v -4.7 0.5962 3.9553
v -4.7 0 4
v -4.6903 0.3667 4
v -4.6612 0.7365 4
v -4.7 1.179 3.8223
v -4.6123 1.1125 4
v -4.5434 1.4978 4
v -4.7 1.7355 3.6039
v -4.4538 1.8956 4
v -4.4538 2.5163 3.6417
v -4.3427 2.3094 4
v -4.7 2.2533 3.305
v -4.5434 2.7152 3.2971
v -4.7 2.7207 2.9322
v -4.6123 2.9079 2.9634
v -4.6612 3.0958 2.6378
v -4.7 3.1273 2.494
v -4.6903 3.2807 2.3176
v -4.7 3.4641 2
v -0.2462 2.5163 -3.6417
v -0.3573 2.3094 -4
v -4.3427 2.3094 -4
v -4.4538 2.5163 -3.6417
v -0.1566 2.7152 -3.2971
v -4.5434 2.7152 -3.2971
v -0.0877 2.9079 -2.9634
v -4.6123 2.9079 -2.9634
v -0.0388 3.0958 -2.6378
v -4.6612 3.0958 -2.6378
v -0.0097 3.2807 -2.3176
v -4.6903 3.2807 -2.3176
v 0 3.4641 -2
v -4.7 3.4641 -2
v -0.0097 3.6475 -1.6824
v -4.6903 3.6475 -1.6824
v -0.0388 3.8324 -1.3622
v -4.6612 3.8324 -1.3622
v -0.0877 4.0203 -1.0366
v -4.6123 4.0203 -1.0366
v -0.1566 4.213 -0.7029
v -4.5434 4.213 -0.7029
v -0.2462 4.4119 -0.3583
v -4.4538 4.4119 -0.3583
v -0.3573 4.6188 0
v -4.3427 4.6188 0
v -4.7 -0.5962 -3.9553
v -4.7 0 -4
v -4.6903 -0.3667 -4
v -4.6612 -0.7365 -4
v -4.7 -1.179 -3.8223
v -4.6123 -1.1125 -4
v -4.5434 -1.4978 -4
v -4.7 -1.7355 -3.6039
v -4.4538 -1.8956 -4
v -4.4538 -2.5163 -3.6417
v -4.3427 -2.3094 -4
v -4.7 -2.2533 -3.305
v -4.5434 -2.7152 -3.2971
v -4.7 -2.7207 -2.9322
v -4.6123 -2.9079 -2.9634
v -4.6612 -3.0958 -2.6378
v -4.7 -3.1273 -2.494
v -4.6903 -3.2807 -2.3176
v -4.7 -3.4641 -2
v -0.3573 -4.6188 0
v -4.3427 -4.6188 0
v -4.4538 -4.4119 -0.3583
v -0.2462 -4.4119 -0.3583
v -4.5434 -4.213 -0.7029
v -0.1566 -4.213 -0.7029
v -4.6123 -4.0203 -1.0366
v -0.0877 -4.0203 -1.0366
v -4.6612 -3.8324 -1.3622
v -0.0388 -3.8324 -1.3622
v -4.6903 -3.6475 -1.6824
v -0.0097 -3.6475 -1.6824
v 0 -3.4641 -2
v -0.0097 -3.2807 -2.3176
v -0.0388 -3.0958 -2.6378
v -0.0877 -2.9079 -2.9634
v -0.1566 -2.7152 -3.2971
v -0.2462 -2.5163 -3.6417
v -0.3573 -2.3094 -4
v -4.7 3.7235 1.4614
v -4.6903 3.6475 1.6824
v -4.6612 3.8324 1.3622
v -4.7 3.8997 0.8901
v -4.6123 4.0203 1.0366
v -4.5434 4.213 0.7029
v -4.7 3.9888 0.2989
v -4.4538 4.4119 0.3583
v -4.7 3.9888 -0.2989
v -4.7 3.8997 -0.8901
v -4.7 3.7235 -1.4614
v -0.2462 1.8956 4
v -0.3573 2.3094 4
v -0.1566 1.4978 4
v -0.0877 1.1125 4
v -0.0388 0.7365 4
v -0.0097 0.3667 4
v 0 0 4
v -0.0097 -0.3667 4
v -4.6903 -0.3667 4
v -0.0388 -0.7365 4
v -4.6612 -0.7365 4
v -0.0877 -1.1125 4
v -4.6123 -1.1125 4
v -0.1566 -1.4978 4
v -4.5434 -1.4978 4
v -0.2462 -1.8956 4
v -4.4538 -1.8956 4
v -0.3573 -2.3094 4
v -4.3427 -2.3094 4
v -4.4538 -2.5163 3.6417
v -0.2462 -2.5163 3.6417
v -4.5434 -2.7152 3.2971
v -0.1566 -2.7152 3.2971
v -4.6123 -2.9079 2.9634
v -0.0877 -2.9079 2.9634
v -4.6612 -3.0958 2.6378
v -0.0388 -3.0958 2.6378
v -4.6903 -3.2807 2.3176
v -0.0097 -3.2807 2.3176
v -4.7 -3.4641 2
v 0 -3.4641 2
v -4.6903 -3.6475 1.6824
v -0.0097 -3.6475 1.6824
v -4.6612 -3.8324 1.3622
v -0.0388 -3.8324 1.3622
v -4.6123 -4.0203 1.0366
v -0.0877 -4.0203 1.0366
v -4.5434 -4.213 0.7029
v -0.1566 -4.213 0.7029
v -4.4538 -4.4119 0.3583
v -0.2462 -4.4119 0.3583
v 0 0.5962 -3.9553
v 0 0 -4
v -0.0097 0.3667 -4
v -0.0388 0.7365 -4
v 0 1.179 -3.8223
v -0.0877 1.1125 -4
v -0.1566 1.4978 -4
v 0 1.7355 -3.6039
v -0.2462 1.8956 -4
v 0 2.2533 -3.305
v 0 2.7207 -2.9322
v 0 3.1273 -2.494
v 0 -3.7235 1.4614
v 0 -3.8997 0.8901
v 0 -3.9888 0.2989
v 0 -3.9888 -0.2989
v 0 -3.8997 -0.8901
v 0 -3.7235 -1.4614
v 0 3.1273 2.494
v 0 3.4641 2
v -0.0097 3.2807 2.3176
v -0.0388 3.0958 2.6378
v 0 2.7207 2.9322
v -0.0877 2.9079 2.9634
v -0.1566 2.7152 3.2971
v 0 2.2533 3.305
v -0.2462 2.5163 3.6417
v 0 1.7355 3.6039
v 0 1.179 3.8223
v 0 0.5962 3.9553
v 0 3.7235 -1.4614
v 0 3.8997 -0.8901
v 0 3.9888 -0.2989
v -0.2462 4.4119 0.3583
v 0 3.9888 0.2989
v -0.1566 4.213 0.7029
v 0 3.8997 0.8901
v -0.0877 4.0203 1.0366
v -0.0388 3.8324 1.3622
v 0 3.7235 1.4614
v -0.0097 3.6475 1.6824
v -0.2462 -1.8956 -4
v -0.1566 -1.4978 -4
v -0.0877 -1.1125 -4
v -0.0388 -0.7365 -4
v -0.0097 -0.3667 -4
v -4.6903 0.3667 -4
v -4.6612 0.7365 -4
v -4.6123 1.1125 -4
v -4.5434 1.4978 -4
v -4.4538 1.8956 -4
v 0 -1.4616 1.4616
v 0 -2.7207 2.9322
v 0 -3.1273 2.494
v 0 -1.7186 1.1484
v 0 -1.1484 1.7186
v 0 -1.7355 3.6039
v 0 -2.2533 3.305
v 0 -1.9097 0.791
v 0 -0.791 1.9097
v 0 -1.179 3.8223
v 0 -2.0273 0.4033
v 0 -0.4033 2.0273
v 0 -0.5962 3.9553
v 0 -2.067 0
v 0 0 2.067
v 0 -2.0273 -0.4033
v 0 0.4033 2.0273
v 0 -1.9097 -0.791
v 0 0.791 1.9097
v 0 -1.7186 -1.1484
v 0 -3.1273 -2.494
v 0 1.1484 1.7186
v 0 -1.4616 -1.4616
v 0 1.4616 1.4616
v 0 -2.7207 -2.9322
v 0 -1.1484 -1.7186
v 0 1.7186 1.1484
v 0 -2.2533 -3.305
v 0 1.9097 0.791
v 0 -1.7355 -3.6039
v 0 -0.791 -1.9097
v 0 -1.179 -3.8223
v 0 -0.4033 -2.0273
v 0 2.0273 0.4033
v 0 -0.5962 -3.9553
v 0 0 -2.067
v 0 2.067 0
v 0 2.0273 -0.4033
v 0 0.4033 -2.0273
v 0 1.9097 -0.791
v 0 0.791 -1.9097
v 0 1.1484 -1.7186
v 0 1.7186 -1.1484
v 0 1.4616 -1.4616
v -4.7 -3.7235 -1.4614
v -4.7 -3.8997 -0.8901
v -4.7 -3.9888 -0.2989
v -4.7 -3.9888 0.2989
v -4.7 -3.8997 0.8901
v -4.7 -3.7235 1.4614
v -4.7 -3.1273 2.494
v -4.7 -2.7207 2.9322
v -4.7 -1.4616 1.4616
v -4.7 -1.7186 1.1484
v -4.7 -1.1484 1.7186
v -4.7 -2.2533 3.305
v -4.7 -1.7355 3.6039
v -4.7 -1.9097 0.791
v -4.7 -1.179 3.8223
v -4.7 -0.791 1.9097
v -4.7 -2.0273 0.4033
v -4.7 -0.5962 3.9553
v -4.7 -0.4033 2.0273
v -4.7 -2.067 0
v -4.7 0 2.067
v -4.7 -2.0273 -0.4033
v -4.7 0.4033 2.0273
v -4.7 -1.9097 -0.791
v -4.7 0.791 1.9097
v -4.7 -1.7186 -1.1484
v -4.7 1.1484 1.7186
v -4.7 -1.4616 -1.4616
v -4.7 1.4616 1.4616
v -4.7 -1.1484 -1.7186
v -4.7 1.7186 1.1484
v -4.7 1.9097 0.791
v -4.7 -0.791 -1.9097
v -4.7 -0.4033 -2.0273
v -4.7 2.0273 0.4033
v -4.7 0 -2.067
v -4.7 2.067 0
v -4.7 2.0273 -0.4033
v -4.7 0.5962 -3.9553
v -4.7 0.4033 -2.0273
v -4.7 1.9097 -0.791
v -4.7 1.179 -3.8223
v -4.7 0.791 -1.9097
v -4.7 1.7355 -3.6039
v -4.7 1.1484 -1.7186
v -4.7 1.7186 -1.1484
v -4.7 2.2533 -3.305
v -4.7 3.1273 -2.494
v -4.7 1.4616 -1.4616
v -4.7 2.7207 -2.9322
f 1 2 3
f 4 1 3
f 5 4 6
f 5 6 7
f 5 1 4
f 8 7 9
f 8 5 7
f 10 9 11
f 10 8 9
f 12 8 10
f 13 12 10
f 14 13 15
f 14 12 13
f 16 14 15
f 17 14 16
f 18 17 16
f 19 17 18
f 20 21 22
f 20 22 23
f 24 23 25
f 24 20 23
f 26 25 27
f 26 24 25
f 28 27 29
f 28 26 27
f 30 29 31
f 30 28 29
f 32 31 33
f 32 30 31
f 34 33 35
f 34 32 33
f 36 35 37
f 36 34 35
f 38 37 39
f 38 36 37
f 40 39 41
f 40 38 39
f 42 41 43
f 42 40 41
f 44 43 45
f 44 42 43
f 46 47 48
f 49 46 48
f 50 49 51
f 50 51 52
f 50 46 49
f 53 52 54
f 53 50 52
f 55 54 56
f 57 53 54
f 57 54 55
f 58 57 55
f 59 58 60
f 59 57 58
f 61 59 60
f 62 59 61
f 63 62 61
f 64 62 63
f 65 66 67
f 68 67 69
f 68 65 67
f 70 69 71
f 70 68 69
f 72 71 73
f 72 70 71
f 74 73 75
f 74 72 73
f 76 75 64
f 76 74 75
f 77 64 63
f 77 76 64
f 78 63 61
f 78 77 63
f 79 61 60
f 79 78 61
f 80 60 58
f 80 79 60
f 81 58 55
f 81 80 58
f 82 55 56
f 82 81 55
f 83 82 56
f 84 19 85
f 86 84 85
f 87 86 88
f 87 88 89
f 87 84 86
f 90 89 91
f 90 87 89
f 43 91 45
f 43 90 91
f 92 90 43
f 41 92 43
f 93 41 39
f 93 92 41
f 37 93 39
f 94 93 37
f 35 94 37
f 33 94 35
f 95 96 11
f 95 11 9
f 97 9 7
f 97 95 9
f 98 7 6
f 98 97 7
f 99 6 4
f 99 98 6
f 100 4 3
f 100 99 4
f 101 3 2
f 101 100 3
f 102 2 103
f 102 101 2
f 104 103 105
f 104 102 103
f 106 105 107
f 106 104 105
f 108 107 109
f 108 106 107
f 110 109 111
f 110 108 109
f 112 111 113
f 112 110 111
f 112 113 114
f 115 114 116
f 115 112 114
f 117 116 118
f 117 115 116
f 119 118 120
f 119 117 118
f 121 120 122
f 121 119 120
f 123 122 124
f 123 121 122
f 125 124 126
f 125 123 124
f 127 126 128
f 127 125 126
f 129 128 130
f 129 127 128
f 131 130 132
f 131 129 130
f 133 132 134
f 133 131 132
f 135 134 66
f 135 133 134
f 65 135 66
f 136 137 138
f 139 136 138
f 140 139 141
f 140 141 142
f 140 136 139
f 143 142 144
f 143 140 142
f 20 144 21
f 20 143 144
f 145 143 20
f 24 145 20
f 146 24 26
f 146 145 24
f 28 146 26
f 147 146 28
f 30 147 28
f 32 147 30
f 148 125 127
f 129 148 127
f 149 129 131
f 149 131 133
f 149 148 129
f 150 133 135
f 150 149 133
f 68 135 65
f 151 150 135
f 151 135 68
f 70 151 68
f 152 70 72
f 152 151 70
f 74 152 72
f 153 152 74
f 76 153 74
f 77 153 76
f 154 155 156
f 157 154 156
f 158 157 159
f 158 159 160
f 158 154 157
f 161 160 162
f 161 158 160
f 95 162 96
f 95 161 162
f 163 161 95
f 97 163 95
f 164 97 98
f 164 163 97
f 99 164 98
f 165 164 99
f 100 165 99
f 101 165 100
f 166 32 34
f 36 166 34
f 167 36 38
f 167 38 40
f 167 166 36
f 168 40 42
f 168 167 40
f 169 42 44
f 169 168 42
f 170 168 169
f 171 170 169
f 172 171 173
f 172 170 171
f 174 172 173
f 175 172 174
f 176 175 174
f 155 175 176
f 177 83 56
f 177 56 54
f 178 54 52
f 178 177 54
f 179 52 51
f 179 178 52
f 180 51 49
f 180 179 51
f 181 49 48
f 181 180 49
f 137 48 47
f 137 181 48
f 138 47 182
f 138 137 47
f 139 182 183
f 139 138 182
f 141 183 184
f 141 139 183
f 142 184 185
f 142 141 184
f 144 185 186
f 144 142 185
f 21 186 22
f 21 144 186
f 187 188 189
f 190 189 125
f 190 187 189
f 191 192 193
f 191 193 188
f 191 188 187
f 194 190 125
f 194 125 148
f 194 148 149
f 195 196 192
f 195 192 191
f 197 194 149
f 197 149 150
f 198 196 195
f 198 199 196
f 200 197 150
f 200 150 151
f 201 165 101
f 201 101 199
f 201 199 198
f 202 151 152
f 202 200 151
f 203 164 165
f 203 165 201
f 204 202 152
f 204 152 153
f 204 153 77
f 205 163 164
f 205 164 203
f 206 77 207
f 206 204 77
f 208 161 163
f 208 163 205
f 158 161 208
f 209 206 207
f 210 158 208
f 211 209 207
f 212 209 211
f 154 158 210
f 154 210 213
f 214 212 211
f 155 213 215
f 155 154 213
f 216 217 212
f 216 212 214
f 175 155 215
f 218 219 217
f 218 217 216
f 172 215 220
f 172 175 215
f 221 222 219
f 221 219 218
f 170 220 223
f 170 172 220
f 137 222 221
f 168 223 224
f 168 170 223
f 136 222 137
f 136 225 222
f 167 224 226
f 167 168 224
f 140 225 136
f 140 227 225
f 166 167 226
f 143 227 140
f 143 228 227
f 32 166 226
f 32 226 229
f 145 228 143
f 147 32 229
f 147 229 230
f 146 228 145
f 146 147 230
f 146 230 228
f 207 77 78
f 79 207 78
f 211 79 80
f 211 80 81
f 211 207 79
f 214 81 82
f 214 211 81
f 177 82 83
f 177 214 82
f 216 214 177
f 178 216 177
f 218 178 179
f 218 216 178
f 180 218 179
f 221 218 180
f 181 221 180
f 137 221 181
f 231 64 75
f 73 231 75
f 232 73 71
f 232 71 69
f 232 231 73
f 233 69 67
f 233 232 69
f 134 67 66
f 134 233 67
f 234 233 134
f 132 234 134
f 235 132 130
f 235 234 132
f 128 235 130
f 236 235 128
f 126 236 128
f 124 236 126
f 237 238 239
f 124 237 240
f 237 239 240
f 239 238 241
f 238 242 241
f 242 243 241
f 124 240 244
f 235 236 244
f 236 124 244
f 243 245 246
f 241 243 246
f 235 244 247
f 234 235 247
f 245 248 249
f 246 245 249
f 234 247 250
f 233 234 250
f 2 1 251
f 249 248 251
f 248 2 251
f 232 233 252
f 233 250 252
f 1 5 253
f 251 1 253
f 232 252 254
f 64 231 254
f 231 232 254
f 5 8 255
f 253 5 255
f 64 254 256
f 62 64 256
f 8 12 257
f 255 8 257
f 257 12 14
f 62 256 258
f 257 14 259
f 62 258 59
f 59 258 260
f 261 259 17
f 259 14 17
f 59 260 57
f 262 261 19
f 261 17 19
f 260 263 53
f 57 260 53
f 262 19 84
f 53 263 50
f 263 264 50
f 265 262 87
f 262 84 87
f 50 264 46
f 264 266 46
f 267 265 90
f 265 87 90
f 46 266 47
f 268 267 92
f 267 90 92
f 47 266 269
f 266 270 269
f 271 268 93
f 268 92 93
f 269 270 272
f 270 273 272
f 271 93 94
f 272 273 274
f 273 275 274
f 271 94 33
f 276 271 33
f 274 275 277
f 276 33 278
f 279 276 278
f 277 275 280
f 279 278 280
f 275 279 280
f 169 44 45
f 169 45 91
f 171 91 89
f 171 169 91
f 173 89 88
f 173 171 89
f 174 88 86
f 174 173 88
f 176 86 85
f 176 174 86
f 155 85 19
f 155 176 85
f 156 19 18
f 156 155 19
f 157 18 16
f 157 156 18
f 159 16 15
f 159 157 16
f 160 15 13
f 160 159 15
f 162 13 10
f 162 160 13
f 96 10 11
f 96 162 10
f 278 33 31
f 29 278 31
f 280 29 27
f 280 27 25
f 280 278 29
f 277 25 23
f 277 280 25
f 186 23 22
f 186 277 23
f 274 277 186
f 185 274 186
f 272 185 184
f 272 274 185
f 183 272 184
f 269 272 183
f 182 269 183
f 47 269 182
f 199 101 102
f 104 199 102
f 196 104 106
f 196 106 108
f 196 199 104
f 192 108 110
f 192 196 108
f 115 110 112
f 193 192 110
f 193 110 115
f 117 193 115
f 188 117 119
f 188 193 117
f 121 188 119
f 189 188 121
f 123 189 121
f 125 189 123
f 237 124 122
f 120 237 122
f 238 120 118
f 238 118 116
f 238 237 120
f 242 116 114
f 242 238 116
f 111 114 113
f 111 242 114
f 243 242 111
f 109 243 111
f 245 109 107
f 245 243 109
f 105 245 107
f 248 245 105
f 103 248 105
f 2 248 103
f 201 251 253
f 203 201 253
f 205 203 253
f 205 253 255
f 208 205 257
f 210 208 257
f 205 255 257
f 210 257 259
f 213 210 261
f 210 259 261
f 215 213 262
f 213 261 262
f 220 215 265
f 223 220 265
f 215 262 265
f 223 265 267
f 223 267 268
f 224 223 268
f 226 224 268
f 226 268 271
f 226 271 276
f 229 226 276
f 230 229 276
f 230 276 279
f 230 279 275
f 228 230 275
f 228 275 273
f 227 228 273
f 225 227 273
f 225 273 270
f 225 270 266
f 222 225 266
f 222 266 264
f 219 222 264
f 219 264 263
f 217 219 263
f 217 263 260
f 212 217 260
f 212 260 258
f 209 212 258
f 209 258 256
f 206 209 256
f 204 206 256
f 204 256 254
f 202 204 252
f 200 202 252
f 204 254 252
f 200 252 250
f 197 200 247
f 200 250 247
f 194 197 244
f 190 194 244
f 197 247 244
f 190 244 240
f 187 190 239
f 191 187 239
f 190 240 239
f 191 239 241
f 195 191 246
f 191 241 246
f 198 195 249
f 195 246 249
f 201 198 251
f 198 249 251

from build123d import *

# Parameters (mm, degrees)
BOSS_EXTRUDE1_DEPTH = 4.7
SKETCH2_OUTSIDE_W   = 42.786
SKETCH2_OUTSIDE_H   = 44.024
SKETCH2_OUTSIDE_R   = 4
CUT_EXTRUDE1_DEPTH  = 8.708653147
CUT_EXTRUDE1_DRAFT  = -60
SKETCH3_OUTSIDE_W   = 42.786
SKETCH3_OUTSIDE_H   = 44.024
SKETCH3_OUTSIDE_R   = 4
CUT_EXTRUDE2_DEPTH  = 8.708653147
CUT_EXTRUDE2_DRAFT  = -60
TAP1_D              = 4.134


with BuildPart() as part:
    # Sketch1 → Boss-Extrude1 (new body)
    with BuildSketch(Plane(origin=(0, 0, 0), x_dir=(0, 0, -1), z_dir=(1, 0, 0))):
        Polygon((0, 4.618802154), (-4, 2.309401077), (-4, -2.309401077), (0, -4.618802154), (4, -2.309401077), (4, 2.309401077), align=None)
    extrude(amount=-BOSS_EXTRUDE1_DEPTH)


with BuildPart() as cut_extrude1_tool:
    # Sketch2 outside → Cut-Extrude1 (with draft: the straight prism first)
    with BuildSketch(Plane(origin=(0, 0, 0), x_dir=(0, 0, -1), z_dir=(1, 0, 0))):
        Rectangle(SKETCH2_OUTSIDE_W, SKETCH2_OUTSIDE_H)
        Circle(SKETCH2_OUTSIDE_R, mode=Mode.SUBTRACT)
    extrude(amount=-CUT_EXTRUDE1_DEPTH)
    # Cut-Extrude1: the draft: its side faces are tilted about the plane it starts from
    cut_extrude1_sides = [cut_extrude1_tool.faces().sort_by_distance(p)[0] for p in [
        (-4.354326573, -22.012, 0),
        (-4.354326573, 0, -21.393),
        (-4.354326573, 22.012, 0),
        (-4.354326573, 0, 21.393),
        (-4.354326573, 0, 4),
    ]]
    draft(cut_extrude1_sides, Plane(origin=(0, 0, 0), x_dir=(0, 0, -1), z_dir=(1, 0, 0)), CUT_EXTRUDE1_DRAFT)


with BuildPart() as part_1:
    add(part.part)

    # Cut-Extrude1: cut by cut_extrude1_tool
    add(cut_extrude1_tool.part, mode=Mode.SUBTRACT)


with BuildPart() as cut_extrude2_tool:
    # Sketch3 outside → Cut-Extrude2 (with draft: the straight prism first)
    with BuildSketch(Plane.ZY.offset(4.7)):
        Rectangle(SKETCH3_OUTSIDE_W, SKETCH3_OUTSIDE_H)
        Circle(SKETCH3_OUTSIDE_R, mode=Mode.SUBTRACT)
    extrude(amount=-CUT_EXTRUDE2_DEPTH)
    # Cut-Extrude2: the draft: its side faces are tilted about the plane it starts from
    cut_extrude2_sides = [cut_extrude2_tool.faces().sort_by_distance(p)[0] for p in [
        (-0.345673427, -22.012, 0),
        (-0.345673427, 0, 21.393),
        (-0.345673427, 22.012, 0),
        (-0.345673427, 0, -21.393),
        (-0.345673427, 0, -4),
    ]]
    draft(cut_extrude2_sides, Plane.ZY.offset(4.7), CUT_EXTRUDE2_DRAFT)


with BuildPart() as part_2:
    add(part_1.part)

    # Cut-Extrude2: cut by cut_extrude2_tool
    add(cut_extrude2_tool.part, mode=Mode.SUBTRACT)

    # Tap1 (through all)
    with Locations(Plane(origin=(0, 0, 0), x_dir=(0, 0, -1), z_dir=(1, 0, 0))):
        with Locations((0, 0)):
            Hole(TAP1_D / 2)


solid = part_2.part
